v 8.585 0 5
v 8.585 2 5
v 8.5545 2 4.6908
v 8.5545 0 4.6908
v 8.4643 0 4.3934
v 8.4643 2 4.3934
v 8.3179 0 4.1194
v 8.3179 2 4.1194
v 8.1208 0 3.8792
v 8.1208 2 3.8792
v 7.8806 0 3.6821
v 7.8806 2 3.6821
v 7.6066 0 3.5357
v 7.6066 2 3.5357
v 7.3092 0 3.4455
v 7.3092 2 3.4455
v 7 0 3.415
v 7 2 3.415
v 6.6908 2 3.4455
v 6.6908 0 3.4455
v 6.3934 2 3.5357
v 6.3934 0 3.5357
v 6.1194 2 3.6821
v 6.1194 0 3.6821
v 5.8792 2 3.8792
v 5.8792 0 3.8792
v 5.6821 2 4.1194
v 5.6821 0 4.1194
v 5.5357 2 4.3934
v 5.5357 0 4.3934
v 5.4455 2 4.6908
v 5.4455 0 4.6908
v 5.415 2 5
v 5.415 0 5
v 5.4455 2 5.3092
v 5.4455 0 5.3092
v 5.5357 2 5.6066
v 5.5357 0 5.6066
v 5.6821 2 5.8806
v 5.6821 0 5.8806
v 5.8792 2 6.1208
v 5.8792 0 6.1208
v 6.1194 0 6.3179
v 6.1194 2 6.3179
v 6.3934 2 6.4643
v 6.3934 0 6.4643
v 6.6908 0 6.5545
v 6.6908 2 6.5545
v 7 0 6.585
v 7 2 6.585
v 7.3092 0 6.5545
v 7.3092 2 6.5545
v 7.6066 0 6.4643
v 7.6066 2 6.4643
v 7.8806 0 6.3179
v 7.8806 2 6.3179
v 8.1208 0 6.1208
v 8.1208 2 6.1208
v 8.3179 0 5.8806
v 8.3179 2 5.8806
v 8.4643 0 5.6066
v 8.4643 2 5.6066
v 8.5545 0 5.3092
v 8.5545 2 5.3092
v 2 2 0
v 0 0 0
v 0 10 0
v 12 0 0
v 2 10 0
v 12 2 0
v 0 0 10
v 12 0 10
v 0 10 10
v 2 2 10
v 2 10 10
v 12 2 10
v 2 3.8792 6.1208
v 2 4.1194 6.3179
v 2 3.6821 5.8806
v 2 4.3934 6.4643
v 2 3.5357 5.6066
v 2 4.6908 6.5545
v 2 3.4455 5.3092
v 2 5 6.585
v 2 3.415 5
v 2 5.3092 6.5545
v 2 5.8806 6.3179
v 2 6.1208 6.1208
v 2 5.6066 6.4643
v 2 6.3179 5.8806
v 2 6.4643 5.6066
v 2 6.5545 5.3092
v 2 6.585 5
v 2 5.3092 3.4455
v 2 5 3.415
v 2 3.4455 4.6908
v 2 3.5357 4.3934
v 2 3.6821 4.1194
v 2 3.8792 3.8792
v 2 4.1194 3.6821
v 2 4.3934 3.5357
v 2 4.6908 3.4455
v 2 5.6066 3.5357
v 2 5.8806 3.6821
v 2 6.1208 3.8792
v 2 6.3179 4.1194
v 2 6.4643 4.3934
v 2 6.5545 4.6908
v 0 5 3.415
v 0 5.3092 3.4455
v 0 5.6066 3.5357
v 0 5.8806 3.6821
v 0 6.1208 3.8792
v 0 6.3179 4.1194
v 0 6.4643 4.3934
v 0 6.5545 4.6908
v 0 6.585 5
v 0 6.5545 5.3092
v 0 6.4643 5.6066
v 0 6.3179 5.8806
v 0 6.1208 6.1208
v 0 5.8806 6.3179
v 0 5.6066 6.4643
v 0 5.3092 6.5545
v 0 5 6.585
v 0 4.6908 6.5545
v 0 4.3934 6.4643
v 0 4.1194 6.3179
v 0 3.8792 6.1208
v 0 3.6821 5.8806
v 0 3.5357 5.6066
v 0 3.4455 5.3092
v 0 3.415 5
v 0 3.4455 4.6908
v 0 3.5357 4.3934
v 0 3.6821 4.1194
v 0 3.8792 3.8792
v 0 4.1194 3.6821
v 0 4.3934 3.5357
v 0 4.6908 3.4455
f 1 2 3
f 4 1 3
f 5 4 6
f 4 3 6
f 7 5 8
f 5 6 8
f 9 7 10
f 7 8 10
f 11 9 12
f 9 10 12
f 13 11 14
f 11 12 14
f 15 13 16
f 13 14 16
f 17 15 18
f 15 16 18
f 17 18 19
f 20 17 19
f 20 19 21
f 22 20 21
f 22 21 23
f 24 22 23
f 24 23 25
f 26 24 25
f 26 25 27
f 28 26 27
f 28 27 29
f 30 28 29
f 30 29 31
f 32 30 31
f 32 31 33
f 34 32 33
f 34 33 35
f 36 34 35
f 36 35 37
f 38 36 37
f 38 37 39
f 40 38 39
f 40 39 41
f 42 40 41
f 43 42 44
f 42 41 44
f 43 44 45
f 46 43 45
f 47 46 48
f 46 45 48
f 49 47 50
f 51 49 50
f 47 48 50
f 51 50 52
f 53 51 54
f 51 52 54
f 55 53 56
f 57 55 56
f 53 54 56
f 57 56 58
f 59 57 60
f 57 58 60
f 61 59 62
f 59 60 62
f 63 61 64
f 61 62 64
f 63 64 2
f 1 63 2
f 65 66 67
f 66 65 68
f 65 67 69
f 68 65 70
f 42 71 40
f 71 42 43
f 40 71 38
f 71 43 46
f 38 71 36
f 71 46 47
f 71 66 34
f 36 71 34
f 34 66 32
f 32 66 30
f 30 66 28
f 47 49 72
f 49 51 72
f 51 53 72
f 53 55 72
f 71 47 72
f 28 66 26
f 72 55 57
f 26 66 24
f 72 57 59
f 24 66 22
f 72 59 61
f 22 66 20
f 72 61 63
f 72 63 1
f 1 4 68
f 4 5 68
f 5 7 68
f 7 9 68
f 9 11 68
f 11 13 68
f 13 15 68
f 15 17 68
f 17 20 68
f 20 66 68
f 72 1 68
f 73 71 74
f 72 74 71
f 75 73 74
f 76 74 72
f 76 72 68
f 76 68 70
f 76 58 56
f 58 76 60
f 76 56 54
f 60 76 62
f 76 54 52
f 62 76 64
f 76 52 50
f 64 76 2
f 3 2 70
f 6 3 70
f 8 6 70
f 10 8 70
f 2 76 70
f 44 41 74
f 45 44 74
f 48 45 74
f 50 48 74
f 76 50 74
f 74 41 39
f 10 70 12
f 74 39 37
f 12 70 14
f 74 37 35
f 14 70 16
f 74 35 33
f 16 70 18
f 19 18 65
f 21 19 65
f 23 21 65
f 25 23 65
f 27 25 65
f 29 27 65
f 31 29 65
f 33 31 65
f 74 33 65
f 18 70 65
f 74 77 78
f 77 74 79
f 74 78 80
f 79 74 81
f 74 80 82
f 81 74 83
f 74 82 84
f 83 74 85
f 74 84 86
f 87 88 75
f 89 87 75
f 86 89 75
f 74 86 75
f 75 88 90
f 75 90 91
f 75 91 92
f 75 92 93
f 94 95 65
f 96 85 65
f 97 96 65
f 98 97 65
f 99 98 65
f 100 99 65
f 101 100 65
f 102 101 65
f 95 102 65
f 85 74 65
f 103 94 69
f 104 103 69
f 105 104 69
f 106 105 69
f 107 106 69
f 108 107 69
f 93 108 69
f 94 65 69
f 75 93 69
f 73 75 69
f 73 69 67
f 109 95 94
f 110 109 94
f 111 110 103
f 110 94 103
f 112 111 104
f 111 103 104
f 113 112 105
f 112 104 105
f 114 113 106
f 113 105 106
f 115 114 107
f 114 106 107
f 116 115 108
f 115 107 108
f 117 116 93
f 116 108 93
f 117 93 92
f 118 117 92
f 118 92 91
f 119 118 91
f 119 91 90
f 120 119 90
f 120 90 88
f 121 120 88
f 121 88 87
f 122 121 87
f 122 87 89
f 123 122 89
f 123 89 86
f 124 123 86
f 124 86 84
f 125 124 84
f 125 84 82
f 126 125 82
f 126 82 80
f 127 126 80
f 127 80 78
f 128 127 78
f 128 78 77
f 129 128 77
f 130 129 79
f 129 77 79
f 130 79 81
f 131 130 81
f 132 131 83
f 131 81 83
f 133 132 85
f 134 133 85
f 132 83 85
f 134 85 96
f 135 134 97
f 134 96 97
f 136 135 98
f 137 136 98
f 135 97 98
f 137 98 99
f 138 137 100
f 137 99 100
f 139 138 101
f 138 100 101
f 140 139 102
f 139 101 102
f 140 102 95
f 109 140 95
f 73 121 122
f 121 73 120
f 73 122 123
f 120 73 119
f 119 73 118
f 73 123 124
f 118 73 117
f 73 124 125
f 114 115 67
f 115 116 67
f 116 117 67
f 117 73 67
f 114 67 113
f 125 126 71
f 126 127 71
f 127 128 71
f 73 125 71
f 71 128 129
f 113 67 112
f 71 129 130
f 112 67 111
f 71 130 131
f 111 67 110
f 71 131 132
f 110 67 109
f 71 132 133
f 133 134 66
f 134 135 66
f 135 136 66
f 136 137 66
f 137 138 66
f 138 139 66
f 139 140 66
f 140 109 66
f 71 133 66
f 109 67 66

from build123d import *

# Parameters (mm, degrees)
BOSS_EXTRUDE1_DEPTH = 10
SKETCH2_R           = 1.585
CUT_EXTRUDE1_DEPTH  = 3
SKETCH3_R           = 1.585
CUT_EXTRUDE2_DEPTH  = 3


with BuildPart() as part:
    # Sketch1 → Boss-Extrude1 (new body)
    with BuildSketch(Plane.XY):
        Polygon((0, 0), (12, 0), (12, 2), (2, 2), (2, 10), (0, 10), align=None)
    extrude(amount=BOSS_EXTRUDE1_DEPTH)

    # Sketch2 → Cut-Extrude1 (cut, through all)
    with BuildSketch(Plane(origin=(0, 2, 0), x_dir=(1, 0, 0), z_dir=(0, 1, 0))):
        with Locations((7, -5)):
            Circle(SKETCH2_R)
    extrude(amount=-CUT_EXTRUDE1_DEPTH, mode=Mode.SUBTRACT)

    # Sketch3 → Cut-Extrude2 (cut, through all)
    with BuildSketch(Plane(origin=(2, 0, 0), x_dir=(0, 0, -1), z_dir=(1, 0, 0))):
        with Locations((-5, 5)):
            Circle(SKETCH3_R)
    extrude(amount=-CUT_EXTRUDE2_DEPTH, mode=Mode.SUBTRACT)


solid = part.part
